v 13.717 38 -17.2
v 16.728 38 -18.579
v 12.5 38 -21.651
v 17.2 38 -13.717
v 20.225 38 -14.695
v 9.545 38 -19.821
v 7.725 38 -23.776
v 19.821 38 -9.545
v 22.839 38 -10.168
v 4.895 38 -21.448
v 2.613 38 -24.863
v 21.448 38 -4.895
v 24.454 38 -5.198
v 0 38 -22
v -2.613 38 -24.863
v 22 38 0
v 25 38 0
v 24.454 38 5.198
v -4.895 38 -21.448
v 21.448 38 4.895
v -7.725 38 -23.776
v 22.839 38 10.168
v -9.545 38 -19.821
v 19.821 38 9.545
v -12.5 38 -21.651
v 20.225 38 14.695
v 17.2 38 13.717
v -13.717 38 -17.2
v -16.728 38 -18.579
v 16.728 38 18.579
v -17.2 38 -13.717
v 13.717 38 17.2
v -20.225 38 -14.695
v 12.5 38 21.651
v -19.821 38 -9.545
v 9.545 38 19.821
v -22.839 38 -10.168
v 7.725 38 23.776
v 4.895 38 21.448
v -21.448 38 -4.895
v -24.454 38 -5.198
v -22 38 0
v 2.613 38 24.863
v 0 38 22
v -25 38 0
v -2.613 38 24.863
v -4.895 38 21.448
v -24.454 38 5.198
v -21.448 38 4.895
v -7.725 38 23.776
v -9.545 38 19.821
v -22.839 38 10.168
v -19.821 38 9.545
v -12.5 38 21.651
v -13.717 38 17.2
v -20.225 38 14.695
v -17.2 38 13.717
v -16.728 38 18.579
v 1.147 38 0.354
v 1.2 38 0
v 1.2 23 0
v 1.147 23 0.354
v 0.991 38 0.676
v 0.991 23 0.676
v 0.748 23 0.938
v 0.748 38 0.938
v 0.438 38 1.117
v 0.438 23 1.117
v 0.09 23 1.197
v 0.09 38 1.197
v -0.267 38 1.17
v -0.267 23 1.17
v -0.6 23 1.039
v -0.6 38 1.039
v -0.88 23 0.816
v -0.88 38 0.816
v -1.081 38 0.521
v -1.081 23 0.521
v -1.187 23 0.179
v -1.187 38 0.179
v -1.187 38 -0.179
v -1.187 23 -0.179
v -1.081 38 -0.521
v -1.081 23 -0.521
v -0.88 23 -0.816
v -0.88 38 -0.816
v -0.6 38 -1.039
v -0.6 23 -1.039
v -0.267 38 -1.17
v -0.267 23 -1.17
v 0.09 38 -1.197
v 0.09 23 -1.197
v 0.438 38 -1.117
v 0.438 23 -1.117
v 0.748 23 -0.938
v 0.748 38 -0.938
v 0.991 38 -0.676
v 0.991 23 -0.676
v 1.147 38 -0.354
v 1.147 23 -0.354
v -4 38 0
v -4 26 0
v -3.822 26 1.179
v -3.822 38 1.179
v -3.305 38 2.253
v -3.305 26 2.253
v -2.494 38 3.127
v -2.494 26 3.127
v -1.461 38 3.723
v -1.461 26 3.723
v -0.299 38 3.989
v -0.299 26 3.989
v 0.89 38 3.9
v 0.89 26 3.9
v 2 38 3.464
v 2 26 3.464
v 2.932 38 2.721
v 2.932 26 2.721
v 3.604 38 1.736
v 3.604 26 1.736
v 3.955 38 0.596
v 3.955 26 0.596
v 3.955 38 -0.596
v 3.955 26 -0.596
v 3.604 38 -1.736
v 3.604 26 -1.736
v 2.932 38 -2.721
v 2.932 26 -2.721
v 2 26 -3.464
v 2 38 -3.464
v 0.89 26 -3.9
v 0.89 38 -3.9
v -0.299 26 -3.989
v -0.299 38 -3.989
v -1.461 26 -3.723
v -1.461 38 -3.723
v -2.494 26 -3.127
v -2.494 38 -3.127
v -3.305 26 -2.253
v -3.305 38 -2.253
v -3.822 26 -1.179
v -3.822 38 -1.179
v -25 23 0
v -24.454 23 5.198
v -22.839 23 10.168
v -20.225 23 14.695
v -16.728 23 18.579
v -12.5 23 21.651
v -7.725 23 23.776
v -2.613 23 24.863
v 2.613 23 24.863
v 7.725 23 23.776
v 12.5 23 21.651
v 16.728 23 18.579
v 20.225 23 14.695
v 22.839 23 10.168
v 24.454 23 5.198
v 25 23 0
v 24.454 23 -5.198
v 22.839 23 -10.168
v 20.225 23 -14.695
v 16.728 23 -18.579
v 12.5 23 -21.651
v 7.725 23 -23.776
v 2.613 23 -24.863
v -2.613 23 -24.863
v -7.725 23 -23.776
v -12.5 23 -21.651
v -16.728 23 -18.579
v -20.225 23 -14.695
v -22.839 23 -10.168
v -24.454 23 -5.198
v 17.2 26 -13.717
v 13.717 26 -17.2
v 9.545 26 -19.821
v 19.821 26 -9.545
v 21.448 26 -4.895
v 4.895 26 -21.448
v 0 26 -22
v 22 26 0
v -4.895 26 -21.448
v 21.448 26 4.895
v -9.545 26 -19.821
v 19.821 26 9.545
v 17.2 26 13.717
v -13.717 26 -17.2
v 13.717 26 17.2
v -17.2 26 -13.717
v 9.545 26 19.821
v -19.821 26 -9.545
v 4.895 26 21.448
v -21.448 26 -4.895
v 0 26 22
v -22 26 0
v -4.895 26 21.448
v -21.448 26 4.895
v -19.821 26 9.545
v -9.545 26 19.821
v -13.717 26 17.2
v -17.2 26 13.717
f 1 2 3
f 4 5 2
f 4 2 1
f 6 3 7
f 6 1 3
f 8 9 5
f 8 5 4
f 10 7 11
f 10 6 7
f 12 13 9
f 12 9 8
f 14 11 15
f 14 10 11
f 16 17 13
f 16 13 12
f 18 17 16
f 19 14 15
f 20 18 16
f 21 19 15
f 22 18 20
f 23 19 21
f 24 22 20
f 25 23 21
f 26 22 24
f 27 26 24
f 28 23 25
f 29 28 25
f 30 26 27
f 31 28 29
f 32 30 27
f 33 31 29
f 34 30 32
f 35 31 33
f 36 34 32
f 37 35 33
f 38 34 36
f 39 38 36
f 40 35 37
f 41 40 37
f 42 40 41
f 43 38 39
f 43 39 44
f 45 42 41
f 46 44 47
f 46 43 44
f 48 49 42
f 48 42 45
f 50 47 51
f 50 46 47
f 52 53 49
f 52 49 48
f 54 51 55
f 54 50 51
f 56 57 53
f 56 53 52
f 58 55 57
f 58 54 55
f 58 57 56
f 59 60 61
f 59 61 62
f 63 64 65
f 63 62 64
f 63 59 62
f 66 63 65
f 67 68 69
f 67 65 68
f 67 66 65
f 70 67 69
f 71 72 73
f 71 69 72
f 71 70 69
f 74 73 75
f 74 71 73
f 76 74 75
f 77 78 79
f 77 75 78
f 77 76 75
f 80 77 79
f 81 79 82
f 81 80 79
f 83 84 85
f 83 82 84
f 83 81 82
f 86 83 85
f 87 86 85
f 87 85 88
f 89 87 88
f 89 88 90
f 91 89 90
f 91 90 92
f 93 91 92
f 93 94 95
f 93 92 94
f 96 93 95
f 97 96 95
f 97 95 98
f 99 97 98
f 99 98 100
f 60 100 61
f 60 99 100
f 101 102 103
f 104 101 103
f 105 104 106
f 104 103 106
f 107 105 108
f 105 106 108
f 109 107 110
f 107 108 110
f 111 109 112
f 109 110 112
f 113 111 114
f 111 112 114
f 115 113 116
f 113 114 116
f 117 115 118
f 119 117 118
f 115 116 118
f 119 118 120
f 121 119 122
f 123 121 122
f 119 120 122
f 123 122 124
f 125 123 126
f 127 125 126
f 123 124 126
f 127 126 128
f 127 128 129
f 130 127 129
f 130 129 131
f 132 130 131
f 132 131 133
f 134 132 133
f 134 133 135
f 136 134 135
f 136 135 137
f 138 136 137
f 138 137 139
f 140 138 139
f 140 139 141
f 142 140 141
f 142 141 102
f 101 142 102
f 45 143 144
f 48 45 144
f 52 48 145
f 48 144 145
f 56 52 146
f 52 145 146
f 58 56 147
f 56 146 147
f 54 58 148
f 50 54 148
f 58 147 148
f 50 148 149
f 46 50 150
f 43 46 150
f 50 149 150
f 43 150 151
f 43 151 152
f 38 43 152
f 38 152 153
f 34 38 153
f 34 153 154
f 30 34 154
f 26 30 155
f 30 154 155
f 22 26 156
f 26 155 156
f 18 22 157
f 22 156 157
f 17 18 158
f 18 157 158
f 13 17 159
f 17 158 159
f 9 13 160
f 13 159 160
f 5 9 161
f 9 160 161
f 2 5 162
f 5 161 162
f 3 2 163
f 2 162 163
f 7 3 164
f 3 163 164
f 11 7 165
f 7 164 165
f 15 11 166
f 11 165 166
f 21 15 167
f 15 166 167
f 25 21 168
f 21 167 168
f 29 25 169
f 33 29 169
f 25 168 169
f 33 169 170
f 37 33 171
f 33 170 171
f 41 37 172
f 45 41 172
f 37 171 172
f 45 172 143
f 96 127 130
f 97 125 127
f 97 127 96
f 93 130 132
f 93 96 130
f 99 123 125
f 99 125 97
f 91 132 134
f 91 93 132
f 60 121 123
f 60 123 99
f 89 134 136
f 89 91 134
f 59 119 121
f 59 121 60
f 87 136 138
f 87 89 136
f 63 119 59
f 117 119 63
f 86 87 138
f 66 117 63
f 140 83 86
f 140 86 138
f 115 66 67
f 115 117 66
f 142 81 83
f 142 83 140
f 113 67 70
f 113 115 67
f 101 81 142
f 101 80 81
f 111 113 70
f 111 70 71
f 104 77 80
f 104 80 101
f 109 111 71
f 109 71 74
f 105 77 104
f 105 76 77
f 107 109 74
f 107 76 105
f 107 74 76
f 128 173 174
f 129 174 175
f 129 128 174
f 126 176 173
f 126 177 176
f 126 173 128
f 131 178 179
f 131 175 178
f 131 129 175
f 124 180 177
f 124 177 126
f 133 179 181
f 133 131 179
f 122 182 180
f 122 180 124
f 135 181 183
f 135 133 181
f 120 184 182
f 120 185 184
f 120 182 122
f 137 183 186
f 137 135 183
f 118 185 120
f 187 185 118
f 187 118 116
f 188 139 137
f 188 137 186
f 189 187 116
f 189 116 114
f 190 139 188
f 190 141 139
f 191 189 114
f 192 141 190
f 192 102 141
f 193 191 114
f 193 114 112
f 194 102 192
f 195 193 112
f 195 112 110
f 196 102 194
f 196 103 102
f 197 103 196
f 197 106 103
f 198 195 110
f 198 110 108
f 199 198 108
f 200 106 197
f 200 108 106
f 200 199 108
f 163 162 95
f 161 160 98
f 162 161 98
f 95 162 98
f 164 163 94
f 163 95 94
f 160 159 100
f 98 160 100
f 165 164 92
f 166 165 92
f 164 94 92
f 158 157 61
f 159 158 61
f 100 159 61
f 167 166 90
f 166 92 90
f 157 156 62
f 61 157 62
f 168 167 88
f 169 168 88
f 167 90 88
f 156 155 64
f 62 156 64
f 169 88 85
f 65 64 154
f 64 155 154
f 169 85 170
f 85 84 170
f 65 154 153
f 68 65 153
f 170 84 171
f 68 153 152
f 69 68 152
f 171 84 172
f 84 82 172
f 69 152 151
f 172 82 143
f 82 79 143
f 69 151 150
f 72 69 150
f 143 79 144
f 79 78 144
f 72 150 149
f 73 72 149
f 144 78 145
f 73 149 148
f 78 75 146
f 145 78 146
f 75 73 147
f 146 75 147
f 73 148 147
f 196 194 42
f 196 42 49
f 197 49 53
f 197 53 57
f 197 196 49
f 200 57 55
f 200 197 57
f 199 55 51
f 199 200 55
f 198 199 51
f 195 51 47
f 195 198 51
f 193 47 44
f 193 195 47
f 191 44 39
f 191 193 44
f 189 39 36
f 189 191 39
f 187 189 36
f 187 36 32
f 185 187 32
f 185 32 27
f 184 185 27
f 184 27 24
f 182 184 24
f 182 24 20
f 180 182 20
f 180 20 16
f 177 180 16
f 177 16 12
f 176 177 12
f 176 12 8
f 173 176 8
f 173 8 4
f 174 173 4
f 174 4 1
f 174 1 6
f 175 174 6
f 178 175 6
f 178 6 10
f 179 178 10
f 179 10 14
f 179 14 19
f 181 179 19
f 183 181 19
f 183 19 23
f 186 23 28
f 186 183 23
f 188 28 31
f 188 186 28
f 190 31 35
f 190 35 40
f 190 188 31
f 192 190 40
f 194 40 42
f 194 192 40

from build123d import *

# Parameters (mm, degrees)
CYLINDER005_R             = 1.2
CYLINDER005_DEPTH         = 32
CYLINDER005_ROLL_ANGLE    = 90
CYLINDER004_R             = 4
CYLINDER004_DEPTH         = 15
CYLINDER004_ROLL_ANGLE    = 90
CYLINDER003_R             = 25
CYLINDER003_DEPTH         = 15
CYLINDER003_ROLL_ANGLE    = 90
THICKNESS001_T            = -3
FUSION001_PLACEMENT_ANGLE = 180


with BuildPart() as wheelshaft:
    # Cylinder005 → Cylinder005 (new body)
    with BuildSketch(Plane.XY):
        Circle(CYLINDER005_R)
    extrude(amount=CYLINDER005_DEPTH)


with BuildPart() as wheelshaft_1:
    # Cylinder005 roll: moved
    add(wheelshaft.part.rotate(Axis((0, 0, 0), (1, 0, 0)), CYLINDER005_ROLL_ANGLE))


with BuildPart() as wheelshaft_2:
    # Cylinder005 placement: moved
    add(wheelshaft_1.part.moved(Location((0, 40, 0))))


with BuildPart() as shaft_holder_b:
    # Cylinder004 → Cylinder004 (new body)
    with BuildSketch(Plane.XY):
        Circle(CYLINDER004_R)
    extrude(amount=CYLINDER004_DEPTH)


with BuildPart() as shaft_holder_b_1:
    # Cylinder004 roll: moved
    add(shaft_holder_b.part.rotate(Axis((0, 0, 0), (1, 0, 0)), CYLINDER004_ROLL_ANGLE))


with BuildPart() as shaft_holder_b_2:
    # Cylinder004 placement: moved
    add(shaft_holder_b_1.part.moved(Location((0, -23, 0))))


with BuildPart() as wheel_shaft_hollow_b:
    # Cylinder003 → Cylinder003 (new body)
    with BuildSketch(Plane.XY):
        Circle(CYLINDER003_R)
    extrude(amount=CYLINDER003_DEPTH)


with BuildPart() as wheel_shaft_hollow_b_1:
    # Cylinder003 roll: moved
    add(wheel_shaft_hollow_b.part.rotate(Axis((0, 0, 0), (1, 0, 0)), CYLINDER003_ROLL_ANGLE))


with BuildPart() as wheel_shaft_hollow_b_2:
    # Cylinder003 placement: moved
    add(wheel_shaft_hollow_b_1.part.moved(Location((0, -23, 0))))

    # Thickness001
    thickness001_openings = [wheel_shaft_hollow_b_2.faces().sort_by_distance(p)[0] for p in [
        (0, -38, 0),
    ]]
    offset(amount=THICKNESS001_T, openings=thickness001_openings)

    # Fusion001: union shaft_holder_b
    add(shaft_holder_b_2.part)


with BuildPart() as wheel_shaft_hollow_b_3:
    # Fusion001 placement: moved
    add(wheel_shaft_hollow_b_2.part.rotate(Axis((0, 0, 0), (0, 0, 1)), FUSION001_PLACEMENT_ANGLE))

    # Cut001: cut wheelshaft
    add(wheelshaft_2.part, mode=Mode.SUBTRACT)


solid = wheel_shaft_hollow_b_3.part
